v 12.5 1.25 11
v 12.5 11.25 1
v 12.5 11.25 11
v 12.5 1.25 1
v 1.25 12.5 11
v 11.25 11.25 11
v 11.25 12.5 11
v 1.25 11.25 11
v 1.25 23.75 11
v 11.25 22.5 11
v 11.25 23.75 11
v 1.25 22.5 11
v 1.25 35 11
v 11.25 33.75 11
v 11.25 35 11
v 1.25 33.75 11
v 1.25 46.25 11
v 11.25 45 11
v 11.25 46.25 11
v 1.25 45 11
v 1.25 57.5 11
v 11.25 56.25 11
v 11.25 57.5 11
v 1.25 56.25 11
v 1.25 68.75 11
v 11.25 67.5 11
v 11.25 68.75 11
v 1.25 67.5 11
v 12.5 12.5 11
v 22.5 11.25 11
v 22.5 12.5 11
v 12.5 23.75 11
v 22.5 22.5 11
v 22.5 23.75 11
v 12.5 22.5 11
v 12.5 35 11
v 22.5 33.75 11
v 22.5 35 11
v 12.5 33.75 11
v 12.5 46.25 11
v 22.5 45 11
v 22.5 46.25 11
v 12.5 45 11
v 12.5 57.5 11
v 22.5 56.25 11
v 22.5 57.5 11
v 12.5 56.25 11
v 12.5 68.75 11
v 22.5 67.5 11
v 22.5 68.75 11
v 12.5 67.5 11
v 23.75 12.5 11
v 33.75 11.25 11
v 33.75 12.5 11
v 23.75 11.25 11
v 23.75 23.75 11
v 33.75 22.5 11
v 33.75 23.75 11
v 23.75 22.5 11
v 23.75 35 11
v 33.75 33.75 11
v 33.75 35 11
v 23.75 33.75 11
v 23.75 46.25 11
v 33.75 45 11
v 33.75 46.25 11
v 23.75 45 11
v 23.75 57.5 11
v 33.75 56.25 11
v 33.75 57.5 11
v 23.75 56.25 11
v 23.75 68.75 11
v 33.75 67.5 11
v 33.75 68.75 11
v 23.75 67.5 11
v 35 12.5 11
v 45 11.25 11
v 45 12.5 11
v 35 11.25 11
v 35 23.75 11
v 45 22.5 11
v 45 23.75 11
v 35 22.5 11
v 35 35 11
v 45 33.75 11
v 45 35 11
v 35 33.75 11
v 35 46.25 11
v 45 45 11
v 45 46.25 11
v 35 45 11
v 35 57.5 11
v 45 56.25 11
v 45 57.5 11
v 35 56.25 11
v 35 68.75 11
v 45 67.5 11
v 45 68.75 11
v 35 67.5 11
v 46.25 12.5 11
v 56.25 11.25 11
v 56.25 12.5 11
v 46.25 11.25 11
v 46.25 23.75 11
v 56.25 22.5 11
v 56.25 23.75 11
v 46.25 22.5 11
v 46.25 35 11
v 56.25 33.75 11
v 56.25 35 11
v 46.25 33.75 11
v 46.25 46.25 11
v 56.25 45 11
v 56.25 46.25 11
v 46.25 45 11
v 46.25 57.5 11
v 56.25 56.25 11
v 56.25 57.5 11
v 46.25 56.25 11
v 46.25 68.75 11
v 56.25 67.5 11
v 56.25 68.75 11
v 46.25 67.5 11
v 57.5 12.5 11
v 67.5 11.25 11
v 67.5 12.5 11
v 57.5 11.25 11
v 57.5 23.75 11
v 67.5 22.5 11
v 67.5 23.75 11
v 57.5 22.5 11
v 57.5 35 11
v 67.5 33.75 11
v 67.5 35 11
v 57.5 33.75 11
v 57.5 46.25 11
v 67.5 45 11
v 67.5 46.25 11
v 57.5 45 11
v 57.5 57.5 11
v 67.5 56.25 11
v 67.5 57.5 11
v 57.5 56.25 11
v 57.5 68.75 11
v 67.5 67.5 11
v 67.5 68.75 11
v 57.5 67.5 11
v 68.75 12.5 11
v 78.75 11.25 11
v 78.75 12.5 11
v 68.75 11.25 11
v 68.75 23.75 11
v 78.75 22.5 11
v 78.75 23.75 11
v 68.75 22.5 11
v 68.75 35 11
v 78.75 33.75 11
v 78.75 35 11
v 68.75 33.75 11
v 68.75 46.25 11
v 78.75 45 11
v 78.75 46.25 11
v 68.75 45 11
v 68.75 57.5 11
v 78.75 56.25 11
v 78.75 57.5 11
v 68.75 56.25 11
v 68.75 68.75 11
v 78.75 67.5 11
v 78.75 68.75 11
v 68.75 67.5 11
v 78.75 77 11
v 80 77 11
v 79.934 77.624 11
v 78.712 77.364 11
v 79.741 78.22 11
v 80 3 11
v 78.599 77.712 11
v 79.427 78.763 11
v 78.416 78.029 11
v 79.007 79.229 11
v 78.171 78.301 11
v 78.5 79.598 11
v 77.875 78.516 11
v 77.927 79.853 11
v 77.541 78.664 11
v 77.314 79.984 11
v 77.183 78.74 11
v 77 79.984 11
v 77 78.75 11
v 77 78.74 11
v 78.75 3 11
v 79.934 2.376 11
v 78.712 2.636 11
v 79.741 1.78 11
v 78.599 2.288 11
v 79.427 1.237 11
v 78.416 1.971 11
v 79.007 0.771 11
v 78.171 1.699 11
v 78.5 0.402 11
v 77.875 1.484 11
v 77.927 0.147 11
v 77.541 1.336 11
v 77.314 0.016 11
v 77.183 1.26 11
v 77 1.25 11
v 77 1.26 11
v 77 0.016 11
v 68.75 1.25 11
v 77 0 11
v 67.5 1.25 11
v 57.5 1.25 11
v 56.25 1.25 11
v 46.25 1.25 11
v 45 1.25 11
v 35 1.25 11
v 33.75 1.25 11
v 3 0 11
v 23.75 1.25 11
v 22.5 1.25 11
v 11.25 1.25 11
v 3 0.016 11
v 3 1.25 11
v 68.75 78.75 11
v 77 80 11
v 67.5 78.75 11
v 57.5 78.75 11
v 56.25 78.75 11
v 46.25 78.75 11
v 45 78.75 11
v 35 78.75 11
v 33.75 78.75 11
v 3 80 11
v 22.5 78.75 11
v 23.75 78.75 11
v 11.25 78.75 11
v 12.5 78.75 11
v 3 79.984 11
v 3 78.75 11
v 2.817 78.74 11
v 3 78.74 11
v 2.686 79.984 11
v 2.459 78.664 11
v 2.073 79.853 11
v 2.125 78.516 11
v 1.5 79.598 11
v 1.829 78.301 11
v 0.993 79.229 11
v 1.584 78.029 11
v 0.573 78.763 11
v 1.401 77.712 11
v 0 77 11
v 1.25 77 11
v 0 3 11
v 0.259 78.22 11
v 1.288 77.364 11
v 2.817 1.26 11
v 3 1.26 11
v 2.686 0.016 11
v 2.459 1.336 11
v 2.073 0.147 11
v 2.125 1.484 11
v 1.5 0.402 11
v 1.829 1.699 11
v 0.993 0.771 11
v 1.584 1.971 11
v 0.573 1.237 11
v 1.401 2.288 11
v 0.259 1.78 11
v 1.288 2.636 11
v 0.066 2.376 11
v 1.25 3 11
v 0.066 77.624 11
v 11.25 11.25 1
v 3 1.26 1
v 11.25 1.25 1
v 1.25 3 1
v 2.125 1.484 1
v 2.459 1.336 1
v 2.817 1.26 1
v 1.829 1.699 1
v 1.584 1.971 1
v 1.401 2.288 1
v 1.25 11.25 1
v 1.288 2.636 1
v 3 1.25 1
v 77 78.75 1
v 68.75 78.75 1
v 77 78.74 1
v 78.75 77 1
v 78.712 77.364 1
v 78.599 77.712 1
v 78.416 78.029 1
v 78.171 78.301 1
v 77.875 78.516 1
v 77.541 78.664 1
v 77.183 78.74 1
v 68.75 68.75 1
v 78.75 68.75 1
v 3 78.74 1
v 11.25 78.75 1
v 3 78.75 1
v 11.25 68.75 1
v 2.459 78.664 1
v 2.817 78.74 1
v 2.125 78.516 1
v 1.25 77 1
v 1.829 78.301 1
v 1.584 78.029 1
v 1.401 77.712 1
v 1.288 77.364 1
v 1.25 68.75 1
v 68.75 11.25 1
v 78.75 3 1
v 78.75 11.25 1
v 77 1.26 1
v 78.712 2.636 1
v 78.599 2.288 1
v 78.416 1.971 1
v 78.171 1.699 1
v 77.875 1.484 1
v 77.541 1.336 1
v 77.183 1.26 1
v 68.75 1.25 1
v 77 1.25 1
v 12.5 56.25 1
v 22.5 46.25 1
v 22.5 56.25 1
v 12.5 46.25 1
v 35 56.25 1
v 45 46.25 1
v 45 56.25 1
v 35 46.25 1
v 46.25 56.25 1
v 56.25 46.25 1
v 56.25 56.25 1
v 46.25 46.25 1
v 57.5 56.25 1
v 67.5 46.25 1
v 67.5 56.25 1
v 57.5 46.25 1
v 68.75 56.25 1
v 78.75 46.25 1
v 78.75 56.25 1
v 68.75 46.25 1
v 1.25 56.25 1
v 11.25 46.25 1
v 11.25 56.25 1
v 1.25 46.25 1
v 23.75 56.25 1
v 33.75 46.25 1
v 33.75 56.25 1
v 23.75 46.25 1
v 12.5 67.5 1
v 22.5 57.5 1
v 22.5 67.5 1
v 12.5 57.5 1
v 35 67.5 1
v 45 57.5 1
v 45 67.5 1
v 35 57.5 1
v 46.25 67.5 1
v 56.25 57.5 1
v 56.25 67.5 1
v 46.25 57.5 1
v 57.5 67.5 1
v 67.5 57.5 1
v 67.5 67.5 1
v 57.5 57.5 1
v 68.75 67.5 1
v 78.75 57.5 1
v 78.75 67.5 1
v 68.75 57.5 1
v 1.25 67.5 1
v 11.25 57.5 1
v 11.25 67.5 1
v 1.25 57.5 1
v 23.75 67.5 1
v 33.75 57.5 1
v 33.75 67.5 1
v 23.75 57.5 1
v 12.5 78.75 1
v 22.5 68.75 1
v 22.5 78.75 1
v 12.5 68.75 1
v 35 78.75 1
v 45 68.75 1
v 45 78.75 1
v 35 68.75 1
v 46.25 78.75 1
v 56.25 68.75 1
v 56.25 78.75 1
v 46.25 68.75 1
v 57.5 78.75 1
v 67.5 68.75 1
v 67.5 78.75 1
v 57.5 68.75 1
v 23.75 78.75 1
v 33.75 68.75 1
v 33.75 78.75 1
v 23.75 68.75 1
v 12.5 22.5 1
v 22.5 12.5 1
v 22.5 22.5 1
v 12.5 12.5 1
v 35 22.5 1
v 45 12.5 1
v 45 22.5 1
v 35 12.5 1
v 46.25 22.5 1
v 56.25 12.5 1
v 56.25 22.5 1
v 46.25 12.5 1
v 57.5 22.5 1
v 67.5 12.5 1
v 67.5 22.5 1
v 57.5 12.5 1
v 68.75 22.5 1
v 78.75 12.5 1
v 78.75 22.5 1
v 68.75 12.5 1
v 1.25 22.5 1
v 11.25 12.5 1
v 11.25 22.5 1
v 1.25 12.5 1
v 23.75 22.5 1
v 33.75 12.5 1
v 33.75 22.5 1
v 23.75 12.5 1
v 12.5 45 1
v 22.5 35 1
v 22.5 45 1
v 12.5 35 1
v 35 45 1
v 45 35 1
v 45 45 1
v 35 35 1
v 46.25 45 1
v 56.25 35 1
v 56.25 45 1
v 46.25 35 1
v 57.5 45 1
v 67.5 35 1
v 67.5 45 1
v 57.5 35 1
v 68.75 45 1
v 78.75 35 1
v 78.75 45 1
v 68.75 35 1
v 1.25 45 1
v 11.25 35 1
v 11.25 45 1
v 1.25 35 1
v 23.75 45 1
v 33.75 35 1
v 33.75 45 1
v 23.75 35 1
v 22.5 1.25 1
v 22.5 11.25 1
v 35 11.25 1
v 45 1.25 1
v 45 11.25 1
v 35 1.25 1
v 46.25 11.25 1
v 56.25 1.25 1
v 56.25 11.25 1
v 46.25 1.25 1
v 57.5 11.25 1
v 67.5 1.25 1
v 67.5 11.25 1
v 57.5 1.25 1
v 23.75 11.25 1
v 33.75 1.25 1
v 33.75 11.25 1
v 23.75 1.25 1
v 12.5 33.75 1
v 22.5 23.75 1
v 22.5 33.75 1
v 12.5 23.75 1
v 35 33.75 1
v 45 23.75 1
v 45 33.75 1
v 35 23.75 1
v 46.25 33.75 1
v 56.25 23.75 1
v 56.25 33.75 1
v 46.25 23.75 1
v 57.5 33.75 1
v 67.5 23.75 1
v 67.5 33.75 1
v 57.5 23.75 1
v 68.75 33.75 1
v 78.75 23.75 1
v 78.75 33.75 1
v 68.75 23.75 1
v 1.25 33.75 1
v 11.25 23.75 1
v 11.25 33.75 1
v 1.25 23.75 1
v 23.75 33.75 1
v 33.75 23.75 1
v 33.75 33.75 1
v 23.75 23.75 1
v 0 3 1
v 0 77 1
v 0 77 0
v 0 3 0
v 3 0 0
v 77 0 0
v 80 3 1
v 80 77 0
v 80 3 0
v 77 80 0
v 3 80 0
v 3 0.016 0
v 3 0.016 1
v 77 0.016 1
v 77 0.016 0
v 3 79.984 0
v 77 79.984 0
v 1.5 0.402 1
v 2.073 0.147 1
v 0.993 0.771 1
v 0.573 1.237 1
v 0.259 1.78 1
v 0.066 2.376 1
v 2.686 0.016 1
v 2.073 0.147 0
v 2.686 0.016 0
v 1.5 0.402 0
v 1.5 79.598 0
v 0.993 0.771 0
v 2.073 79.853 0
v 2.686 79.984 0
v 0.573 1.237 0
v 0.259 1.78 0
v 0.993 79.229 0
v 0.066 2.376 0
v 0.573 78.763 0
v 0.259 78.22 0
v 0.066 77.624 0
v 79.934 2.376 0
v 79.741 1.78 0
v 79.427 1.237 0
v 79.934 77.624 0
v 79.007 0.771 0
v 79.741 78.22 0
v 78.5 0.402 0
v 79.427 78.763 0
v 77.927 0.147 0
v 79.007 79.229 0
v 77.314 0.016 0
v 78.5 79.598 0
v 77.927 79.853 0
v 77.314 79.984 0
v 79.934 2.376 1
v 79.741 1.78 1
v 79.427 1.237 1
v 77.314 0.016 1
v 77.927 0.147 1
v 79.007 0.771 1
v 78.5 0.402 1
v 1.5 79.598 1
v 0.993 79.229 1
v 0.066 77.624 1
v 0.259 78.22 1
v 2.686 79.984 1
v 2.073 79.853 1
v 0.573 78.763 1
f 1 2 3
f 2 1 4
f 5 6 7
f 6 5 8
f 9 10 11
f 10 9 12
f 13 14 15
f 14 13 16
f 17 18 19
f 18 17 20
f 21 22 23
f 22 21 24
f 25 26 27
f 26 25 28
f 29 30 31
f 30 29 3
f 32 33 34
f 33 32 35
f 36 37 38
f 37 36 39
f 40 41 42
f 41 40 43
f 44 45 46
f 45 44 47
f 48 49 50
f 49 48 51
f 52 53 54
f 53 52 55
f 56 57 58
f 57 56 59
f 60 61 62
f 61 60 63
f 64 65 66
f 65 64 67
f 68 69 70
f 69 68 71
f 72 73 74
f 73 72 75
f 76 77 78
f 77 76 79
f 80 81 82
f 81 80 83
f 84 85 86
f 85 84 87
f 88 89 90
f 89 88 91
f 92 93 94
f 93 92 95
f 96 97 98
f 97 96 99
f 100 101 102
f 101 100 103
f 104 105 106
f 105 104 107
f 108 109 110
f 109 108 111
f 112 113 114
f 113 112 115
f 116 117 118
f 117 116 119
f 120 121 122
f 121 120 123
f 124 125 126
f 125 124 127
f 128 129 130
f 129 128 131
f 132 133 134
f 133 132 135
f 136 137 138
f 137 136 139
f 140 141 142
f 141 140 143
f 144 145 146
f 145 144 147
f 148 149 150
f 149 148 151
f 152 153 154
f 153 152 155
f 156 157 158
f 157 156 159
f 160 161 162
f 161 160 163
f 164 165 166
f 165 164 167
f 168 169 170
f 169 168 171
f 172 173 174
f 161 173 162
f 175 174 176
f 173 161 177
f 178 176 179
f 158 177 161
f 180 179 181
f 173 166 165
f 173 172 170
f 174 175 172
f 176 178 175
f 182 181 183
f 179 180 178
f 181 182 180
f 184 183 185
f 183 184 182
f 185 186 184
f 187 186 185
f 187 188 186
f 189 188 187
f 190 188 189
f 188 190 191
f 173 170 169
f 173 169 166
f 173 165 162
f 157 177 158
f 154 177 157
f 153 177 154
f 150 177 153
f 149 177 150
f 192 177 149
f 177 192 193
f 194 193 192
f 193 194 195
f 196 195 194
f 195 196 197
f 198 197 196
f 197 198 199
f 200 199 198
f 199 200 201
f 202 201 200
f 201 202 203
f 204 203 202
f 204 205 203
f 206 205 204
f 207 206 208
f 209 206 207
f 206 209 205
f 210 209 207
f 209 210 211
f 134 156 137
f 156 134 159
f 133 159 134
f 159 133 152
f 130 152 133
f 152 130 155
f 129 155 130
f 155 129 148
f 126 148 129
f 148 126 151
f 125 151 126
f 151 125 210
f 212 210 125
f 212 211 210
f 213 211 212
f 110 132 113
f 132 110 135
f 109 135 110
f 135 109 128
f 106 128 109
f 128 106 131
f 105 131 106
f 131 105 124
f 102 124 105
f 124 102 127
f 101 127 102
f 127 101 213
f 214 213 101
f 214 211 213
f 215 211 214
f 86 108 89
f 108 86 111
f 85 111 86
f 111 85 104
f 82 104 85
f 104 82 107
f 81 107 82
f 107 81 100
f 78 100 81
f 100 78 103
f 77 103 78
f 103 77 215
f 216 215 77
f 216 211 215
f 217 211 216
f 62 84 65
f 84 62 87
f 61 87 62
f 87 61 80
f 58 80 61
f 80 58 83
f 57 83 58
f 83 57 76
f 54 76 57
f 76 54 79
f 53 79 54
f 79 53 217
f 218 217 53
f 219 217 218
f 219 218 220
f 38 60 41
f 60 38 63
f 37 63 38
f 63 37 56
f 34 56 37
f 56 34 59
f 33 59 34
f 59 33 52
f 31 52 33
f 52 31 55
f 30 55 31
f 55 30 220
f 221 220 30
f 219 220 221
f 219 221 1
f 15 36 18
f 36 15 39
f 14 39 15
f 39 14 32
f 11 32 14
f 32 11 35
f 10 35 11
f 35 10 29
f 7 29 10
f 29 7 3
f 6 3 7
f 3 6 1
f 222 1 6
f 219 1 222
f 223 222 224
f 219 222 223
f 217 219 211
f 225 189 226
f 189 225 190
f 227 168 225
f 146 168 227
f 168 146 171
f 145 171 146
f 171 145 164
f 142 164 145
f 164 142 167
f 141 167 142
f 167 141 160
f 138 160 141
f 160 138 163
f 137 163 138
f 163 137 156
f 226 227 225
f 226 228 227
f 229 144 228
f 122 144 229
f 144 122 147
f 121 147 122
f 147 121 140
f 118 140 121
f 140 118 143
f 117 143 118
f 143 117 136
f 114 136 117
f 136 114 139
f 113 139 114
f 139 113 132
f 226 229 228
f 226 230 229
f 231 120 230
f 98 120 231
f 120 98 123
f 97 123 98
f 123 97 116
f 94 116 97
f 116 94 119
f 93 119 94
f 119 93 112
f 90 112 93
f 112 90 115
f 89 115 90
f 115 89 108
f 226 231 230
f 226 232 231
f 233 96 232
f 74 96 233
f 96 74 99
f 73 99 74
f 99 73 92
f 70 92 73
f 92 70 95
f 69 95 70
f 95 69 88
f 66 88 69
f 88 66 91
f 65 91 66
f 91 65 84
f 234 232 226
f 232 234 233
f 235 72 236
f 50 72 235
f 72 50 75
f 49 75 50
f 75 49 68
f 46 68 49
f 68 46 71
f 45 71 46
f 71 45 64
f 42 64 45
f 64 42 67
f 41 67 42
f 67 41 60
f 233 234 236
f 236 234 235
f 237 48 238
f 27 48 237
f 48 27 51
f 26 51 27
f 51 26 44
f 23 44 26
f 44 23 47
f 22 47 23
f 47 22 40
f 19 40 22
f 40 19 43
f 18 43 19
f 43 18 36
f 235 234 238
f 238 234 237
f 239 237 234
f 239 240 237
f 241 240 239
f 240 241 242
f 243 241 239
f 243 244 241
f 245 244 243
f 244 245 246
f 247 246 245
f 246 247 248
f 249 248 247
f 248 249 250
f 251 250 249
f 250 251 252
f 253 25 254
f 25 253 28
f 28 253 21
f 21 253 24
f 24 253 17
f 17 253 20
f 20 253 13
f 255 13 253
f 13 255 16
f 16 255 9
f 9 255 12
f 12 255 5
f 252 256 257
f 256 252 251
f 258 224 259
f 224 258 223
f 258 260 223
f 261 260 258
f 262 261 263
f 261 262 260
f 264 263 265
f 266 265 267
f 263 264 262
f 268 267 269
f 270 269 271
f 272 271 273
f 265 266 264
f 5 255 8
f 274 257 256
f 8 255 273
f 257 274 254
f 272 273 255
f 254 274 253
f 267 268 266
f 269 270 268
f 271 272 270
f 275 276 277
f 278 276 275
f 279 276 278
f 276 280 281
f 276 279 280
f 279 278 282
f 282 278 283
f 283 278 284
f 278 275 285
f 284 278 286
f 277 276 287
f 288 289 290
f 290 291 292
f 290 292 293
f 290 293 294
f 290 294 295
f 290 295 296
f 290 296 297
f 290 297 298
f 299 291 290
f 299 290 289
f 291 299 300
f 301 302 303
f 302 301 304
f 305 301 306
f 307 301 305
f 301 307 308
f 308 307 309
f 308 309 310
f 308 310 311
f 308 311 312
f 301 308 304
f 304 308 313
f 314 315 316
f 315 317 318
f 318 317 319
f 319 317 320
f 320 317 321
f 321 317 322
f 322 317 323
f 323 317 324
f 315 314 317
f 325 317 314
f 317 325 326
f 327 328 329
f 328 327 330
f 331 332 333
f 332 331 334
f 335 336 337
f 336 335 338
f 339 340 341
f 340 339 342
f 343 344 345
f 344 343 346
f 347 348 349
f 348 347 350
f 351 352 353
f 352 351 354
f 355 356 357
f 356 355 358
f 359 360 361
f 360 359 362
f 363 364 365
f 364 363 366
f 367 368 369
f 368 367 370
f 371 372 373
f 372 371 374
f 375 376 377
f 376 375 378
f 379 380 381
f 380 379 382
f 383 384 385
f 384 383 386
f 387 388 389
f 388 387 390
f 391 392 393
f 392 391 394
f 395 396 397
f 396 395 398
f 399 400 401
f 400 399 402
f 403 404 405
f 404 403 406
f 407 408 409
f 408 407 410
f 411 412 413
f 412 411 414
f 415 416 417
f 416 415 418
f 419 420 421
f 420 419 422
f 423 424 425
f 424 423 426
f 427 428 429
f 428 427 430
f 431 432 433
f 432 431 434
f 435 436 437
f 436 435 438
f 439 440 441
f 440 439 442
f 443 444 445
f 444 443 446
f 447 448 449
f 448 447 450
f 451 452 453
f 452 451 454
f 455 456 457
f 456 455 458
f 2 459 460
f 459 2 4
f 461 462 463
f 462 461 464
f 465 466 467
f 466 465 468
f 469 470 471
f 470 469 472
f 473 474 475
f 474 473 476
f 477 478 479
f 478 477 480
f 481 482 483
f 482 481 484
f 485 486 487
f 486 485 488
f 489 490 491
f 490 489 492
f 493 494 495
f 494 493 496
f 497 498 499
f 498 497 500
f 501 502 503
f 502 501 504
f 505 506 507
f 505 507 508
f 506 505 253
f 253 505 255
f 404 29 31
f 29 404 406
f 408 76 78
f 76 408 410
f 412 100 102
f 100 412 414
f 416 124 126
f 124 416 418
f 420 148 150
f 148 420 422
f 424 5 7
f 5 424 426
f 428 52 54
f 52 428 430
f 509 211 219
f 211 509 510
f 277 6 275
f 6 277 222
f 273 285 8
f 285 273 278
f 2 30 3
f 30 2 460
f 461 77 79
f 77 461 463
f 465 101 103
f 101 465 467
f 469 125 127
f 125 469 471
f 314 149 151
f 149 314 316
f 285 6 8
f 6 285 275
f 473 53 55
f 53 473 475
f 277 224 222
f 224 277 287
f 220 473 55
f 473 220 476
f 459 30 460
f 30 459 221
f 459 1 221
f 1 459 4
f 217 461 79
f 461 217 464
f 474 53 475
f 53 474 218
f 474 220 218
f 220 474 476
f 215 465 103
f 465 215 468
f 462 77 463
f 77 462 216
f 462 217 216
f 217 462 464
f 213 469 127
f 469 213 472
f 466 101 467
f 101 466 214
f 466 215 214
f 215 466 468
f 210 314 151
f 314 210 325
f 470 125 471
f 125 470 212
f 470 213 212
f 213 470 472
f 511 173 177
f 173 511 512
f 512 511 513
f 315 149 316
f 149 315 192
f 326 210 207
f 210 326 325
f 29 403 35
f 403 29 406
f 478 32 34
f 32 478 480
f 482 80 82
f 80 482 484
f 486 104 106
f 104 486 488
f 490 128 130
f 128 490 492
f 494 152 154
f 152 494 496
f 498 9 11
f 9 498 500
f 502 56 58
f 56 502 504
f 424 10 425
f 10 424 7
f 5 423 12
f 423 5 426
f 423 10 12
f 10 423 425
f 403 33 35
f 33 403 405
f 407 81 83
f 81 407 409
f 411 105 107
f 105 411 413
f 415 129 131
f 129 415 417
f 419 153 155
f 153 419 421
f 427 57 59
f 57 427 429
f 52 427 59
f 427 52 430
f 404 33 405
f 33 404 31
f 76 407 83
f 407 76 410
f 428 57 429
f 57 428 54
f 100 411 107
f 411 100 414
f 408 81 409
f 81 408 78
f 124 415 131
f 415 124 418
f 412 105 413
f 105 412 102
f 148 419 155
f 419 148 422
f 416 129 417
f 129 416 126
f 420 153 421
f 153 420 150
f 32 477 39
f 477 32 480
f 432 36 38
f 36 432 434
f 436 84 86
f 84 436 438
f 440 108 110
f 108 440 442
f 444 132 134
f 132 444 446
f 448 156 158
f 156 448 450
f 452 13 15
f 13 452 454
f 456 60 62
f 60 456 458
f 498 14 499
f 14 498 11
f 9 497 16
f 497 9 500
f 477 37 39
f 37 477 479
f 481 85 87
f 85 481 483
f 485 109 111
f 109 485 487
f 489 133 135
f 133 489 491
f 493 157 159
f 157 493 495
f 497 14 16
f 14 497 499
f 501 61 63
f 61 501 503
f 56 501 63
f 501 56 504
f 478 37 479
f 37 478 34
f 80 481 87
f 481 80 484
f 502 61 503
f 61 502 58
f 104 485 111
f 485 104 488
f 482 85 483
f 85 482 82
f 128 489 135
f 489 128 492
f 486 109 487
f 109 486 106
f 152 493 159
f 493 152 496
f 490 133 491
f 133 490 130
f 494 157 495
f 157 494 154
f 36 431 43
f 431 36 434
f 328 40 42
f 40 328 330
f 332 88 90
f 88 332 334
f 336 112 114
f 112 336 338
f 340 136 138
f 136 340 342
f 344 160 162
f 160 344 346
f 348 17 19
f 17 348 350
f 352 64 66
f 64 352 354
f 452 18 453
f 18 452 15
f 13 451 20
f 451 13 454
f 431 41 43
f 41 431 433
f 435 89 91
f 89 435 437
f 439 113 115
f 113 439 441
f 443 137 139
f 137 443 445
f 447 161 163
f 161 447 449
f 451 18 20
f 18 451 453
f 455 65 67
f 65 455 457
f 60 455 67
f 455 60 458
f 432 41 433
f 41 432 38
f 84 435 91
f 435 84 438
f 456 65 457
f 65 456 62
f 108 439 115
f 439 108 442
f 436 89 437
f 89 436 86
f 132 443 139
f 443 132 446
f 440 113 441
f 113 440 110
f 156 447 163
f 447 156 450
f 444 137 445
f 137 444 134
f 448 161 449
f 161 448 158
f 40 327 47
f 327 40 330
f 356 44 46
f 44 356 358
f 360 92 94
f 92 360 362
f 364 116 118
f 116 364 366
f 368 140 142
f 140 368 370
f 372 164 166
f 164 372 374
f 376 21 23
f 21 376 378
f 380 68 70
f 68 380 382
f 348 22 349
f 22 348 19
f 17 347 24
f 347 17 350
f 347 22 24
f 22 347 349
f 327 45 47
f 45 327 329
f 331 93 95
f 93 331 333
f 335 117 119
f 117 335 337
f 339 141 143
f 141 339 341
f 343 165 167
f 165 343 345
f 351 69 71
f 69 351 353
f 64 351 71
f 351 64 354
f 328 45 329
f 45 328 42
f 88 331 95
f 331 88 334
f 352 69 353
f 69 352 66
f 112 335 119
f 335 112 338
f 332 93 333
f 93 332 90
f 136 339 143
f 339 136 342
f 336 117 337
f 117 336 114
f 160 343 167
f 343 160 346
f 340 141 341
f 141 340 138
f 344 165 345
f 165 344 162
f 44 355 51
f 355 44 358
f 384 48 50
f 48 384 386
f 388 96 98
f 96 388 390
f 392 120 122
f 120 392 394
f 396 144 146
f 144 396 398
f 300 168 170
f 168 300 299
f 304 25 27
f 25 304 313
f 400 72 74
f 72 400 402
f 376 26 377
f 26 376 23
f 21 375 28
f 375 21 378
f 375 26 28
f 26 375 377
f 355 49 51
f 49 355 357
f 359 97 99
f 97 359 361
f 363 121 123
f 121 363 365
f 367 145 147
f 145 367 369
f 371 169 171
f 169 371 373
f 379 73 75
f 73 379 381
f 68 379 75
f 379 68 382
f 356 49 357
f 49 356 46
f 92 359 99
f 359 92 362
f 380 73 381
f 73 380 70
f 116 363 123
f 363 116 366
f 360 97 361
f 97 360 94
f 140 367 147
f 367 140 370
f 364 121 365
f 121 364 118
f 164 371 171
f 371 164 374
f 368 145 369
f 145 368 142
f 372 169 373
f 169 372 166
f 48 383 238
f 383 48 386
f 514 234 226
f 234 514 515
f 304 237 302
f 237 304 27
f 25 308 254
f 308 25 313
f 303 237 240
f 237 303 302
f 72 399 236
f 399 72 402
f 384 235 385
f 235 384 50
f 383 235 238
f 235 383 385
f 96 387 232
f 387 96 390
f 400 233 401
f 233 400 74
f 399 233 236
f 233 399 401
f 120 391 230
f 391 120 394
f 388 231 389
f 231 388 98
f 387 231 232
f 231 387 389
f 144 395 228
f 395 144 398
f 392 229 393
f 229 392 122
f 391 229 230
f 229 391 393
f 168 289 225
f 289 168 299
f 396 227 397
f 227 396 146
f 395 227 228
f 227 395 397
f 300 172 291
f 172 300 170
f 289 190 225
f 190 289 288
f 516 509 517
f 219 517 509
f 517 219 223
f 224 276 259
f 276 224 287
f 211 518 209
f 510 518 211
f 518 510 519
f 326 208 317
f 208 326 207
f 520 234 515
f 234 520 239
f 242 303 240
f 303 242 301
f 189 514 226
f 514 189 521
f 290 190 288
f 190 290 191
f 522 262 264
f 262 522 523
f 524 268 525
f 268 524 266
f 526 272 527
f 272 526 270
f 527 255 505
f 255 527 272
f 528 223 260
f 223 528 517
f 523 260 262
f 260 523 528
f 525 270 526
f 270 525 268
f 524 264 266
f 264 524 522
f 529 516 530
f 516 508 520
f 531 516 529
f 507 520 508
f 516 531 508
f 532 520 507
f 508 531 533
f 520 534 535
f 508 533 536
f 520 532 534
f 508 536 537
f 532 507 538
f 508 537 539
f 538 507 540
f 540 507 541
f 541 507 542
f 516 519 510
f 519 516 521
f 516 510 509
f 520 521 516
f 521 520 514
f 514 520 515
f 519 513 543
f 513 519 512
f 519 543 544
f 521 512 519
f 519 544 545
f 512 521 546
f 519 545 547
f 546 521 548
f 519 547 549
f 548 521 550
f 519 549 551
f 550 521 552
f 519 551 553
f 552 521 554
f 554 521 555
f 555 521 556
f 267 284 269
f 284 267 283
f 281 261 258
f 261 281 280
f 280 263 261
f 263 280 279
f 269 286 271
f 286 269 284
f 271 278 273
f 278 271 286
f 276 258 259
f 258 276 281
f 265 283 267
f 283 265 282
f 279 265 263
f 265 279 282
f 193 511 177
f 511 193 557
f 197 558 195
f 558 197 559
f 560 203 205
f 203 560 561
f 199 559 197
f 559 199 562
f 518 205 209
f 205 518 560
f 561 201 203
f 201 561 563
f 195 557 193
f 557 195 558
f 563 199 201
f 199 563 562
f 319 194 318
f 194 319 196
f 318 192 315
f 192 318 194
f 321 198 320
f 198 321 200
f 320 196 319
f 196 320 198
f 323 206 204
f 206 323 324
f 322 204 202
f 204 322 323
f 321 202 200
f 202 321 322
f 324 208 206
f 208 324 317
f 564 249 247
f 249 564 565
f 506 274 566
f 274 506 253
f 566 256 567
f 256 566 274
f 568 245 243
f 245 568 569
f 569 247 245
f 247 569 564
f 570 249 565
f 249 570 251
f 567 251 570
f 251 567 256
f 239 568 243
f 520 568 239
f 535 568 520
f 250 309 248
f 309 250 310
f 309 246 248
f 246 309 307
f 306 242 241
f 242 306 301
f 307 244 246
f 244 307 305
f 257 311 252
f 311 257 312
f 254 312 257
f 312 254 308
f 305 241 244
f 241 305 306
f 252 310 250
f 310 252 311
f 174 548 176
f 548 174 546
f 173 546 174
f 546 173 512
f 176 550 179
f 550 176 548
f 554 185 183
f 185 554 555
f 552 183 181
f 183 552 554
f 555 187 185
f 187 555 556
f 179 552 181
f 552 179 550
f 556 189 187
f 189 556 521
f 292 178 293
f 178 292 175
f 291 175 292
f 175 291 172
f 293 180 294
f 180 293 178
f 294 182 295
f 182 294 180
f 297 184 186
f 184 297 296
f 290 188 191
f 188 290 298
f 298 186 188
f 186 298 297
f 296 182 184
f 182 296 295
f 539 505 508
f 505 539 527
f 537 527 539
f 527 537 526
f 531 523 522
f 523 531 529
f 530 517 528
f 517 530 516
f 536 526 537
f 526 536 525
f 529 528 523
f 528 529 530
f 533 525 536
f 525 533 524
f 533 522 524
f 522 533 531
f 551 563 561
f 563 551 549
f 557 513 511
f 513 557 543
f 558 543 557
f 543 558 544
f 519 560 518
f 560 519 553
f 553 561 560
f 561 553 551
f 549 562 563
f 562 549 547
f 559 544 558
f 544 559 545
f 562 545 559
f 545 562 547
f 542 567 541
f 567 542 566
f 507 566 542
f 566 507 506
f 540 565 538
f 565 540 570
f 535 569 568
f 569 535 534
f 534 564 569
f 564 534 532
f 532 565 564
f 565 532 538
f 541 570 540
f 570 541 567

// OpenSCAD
// all dimensions in millimeters
//How thick each wall is in mm
wall_thickness = 10/8; 
//How tall is the grid?
grid_height=10; 
//side length of pen hole square
square_size=10; 
//How many squares long?
X_squares=7; 
//How many squares Wide?
Y_squares=7;
//rounded corners?, 0 means sharp corners
corner_radius=3; 
//0 means no floor
floor_height = 1; 


//example 1: seen on http://www.thingiverse.com/thing:1294085/#files
//cubistand base.stl
//wall_thickness = 10/8;
//square_size=10;
//X_squares=7;
//Y_squares=7;
//corner_radius=3;
//grid_height=10;
//floor_height = 1;

//example 2: seen on http://www.thingiverse.com/thing:1294085/#files
//cubistand main.stl
//wall_thickness = 10/8;
//square_size=10;
//X_squares=7;
//Y_squares=7;
//corner_radius=3;
//grid_height=10;
//floor_height = 0; //0 means no floor

//example 3: seen on http://www.thingiverse.com/thing:1294085/#files
//cubistand_rod_cap.stl
//wall_thickness = 10/8;
//square_size=10;
//X_squares=1;
//Y_squares=1;
//corner_radius=0;
//grid_height=5;
//floor_height = 1; //0 means no floor


total_height=grid_height+floor_height;
$fn=30; //higher number, smoother curve surface, longer render time

//generation of grid  
translate([0,0,floor_height ])
difference()
{
for (j=[1:Y_squares])
    translate([0,(j-1)*(square_size+wall_thickness),0])
for (i=[1:X_squares])
   translate([(i-1)*(square_size+wall_thickness),0,0])
     difference () {
         cube([square_size+2*wall_thickness,square_size+2*wall_thickness,grid_height]);
         translate([wall_thickness,wall_thickness,0])
            cube([square_size,square_size,grid_height]);

     }

//remove corners   
 cube([corner_radius,corner_radius,grid_height]);  
 
  translate(  [X_squares*(square_size+wall_thickness)-corner_radius+wall_thickness,0,0])
      cube([corner_radius,corner_radius,grid_height]);  
     
  translate(  [0,Y_squares*(square_size+wall_thickness)-corner_radius+wall_thickness,0])
      cube([corner_radius,corner_radius,grid_height]); 

  translate(  [X_squares*(square_size+wall_thickness)-corner_radius+wall_thickness,Y_squares*(square_size+wall_thickness)-corner_radius+wall_thickness,0])
      cube([corner_radius,corner_radius,grid_height]);      
   
 }  
 
 //make rounded corners
 intersection()
 {
  cube([corner_radius,corner_radius,total_height]);    
 translate(  [corner_radius,corner_radius,0])
  difference()
     {    
     cylinder(  total_height,    corner_radius,    corner_radius);  
       cylinder(  total_height,    corner_radius-wall_thickness,    corner_radius-wall_thickness);  
     }
 }
 
 
 intersection()
 {
  cube([corner_radius,corner_radius,total_height]);    
 translate(  [corner_radius,corner_radius,0])
  difference()
     {    
     cylinder(  total_height,    corner_radius,    corner_radius);  
       cylinder(  total_height,    corner_radius-wall_thickness,    corner_radius-wall_thickness);  
     }
 }
 
 
 translate(  [X_squares*(square_size+wall_thickness)-corner_radius+wall_thickness,0,0])
  intersection()
 {
  cube([corner_radius,corner_radius,total_height]);    
 translate(  [0,corner_radius,0])
  difference()
     {    
     cylinder(  total_height,    corner_radius,    corner_radius);  
       cylinder(  total_height,    corner_radius-wall_thickness,    corner_radius-wall_thickness);  
     }
 }
 
translate(  [0,Y_squares*(square_size+wall_thickness)-corner_radius+wall_thickness,0])
  intersection()
 {
  cube([corner_radius,corner_radius,total_height]);    
 translate(  [corner_radius,0,0])
  difference()
     {    
     cylinder(  total_height,    corner_radius,    corner_radius);  
       cylinder(  total_height,    corner_radius-wall_thickness,    corner_radius-wall_thickness);  
     }
 }
 
 translate(  [X_squares*(square_size+wall_thickness)-corner_radius+wall_thickness,Y_squares*(square_size+wall_thickness)-corner_radius+wall_thickness,0])
  intersection()
 {
  cube([corner_radius,corner_radius,total_height]);    
 translate(  [0,0,0])
  difference()
     {    
     cylinder(  total_height,    corner_radius,    corner_radius);  
       cylinder(  total_height,    corner_radius-wall_thickness,    corner_radius-wall_thickness);  
     }
 }
 
 
 //para hacer el suelo, si lo hay (floor_height>1)
 //hago un cubo del tamaño total, de altura -floorheight
 //le quito las esquinas y añado cilindros
 difference()
{
 cube(  [X_squares*(square_size+wall_thickness)+wall_thickness,Y_squares*(square_size+wall_thickness)+wall_thickness, floor_height]);
    
    
    //remove corners   
 cube([corner_radius,corner_radius,floor_height]);  
 
  translate(  [X_squares*(square_size+wall_thickness)-corner_radius+wall_thickness,0,0])
      cube([corner_radius,corner_radius,floor_height]);  
     
  translate(  [0,Y_squares*(square_size+wall_thickness)-corner_radius+wall_thickness,0])
      cube([corner_radius,corner_radius,floor_height]); 

  translate(  [X_squares*(square_size+wall_thickness)-corner_radius+wall_thickness,Y_squares*(square_size+wall_thickness)-corner_radius+wall_thickness,0])
      cube([corner_radius,corner_radius,floor_height]);  
}

//añado cilindros en las esquinas del suelo
// esquina 0,0
translate(  [corner_radius,corner_radius,0])
     cylinder(  floor_height,    corner_radius,    corner_radius);  

//esquina X,0
 translate(  [X_squares*(square_size+wall_thickness)-corner_radius+wall_thickness,corner_radius,0]) 
     cylinder(  floor_height,    corner_radius,    corner_radius);  

//esquina 0,Y 
translate(  [corner_radius,Y_squares*(square_size+wall_thickness)-corner_radius+wall_thickness,0])
     cylinder(  floor_height,    corner_radius,    corner_radius);  
 
 
//esquina X,Y 
 translate(  [X_squares*(square_size+wall_thickness)-corner_radius+wall_thickness,Y_squares*(square_size+wall_thickness)-corner_radius+wall_thickness,0])
     cylinder(  floor_height,    corner_radius,    corner_radius);  
       
